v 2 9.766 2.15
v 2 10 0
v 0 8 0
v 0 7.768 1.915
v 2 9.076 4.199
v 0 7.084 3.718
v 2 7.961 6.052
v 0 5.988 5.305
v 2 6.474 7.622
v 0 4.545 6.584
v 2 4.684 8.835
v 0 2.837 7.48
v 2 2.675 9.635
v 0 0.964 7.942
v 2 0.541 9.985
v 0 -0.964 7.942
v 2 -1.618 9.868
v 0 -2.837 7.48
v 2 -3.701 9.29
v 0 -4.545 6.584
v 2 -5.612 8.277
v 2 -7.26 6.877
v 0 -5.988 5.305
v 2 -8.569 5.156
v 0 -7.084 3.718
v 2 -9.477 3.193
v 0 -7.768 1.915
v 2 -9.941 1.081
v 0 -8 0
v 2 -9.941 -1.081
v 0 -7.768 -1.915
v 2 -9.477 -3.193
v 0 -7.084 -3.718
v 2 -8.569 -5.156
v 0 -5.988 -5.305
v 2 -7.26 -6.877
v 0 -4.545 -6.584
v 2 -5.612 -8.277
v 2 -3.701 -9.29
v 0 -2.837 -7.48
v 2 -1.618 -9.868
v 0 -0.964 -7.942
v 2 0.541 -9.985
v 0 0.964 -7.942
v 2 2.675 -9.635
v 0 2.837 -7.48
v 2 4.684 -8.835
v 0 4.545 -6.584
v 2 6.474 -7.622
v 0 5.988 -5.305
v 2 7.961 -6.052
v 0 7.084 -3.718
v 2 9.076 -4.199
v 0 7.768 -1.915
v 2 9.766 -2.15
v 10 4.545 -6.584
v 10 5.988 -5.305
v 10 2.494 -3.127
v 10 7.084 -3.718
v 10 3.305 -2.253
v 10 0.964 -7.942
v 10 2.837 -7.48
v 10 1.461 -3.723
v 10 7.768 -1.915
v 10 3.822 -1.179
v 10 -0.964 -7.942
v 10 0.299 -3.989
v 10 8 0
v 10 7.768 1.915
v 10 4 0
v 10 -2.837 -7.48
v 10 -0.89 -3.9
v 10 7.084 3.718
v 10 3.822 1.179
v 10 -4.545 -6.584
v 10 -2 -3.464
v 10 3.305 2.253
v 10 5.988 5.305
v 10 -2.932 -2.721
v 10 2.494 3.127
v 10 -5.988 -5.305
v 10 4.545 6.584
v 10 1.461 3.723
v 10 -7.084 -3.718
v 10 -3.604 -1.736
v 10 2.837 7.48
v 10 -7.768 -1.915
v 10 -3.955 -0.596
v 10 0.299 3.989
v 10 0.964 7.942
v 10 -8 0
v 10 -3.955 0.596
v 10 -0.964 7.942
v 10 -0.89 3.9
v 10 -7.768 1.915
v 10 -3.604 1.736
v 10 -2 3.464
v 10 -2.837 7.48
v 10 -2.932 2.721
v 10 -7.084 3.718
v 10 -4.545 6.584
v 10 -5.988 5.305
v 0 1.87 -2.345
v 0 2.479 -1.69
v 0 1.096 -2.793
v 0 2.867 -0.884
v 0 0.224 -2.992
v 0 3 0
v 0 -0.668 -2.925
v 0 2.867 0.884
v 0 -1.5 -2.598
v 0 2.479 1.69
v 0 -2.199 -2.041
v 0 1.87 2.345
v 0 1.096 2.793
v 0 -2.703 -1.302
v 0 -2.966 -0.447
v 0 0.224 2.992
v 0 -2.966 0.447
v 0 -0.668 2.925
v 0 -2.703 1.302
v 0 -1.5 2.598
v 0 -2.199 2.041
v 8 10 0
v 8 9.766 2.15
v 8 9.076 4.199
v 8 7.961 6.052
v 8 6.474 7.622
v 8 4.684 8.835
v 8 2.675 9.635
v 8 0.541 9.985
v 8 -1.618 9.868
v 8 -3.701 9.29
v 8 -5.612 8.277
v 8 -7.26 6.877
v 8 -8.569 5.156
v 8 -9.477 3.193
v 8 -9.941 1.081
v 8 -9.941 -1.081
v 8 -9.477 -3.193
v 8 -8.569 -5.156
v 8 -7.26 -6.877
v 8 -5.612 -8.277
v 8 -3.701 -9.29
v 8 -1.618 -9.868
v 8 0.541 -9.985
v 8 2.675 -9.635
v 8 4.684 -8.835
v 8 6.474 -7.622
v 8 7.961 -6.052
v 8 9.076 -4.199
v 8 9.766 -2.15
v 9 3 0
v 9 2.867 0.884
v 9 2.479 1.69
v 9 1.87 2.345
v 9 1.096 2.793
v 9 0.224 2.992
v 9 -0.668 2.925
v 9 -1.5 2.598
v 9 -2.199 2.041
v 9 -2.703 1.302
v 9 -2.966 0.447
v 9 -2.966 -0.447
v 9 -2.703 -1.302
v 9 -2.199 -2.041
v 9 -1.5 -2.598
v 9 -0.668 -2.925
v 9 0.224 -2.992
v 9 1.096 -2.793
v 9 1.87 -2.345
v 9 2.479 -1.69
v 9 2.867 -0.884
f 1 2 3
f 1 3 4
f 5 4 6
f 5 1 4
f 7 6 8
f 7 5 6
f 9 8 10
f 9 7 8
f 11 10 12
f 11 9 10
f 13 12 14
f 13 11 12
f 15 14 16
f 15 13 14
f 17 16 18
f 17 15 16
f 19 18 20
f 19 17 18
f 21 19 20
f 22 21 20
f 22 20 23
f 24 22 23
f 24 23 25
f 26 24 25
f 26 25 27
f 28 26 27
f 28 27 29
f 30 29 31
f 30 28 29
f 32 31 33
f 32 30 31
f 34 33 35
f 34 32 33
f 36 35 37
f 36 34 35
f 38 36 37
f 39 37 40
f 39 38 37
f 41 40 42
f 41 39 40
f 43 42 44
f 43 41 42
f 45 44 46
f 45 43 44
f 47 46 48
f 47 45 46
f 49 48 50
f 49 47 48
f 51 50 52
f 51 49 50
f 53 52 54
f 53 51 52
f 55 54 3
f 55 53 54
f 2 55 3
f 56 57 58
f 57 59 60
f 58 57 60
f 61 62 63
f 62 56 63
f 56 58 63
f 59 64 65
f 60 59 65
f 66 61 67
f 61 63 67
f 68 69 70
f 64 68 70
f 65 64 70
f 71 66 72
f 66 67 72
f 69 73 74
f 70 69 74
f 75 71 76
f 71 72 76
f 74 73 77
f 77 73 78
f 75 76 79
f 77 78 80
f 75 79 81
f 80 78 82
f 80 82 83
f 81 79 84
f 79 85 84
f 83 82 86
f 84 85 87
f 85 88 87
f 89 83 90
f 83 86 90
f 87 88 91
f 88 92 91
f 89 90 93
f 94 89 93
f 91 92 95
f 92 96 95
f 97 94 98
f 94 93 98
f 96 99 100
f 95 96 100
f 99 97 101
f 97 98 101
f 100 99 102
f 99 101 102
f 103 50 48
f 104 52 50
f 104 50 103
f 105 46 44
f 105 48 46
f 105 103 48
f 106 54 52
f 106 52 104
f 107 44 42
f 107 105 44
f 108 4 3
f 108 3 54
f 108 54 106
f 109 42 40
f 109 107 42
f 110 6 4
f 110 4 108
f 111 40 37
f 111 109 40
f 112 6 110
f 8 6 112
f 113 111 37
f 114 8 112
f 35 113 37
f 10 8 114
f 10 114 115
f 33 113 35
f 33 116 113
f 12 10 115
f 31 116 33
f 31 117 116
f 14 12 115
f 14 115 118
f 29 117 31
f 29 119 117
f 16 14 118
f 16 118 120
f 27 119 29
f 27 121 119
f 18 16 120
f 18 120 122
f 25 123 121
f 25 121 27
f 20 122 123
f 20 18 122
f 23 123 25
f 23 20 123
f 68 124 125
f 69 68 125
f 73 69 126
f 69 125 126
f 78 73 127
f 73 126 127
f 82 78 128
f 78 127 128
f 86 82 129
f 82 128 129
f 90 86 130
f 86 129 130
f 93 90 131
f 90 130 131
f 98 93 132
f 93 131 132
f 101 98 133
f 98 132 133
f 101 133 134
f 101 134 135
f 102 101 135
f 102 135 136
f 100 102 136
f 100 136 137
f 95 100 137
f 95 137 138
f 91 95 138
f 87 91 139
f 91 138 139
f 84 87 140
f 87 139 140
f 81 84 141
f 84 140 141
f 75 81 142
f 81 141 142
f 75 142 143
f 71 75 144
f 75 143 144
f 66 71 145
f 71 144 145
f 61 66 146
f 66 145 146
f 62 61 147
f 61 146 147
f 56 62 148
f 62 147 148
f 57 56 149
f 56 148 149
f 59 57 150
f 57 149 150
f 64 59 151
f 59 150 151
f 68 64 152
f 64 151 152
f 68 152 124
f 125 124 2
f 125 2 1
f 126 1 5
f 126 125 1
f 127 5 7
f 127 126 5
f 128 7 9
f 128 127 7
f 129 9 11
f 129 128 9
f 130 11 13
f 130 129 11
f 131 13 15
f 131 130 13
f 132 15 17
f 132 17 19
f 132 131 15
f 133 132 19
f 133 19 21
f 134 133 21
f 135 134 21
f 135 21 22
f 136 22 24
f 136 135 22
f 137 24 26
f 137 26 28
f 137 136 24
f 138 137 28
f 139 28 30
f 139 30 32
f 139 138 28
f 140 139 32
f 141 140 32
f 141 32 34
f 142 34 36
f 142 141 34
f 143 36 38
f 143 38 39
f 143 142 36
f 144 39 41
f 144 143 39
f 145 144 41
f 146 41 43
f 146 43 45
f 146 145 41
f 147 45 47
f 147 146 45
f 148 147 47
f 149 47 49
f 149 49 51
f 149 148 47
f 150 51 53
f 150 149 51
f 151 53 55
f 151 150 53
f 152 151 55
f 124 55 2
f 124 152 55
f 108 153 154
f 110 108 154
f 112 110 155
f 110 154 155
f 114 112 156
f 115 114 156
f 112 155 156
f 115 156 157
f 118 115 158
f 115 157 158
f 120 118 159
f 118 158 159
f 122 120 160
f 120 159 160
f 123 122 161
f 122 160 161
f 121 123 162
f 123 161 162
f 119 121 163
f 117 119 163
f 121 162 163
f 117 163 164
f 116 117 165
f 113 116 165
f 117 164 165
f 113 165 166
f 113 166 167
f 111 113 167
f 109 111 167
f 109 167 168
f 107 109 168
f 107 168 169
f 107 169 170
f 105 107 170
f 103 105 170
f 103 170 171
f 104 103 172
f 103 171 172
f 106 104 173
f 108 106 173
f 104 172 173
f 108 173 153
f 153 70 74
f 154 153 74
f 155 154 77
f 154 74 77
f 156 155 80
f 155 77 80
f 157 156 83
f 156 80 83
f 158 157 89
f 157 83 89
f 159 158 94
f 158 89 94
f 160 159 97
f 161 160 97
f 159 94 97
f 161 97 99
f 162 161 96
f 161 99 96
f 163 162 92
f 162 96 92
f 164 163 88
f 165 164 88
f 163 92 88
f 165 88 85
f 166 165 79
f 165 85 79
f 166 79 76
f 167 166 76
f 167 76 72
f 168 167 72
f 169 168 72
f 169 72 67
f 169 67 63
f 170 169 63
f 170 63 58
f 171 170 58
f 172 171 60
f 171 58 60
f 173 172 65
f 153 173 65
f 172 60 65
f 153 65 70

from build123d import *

# Parameters (mm, degrees)
SKETCH1_W     = 10
SKETCH1_H     = 7
CHAMFER1_SIZE = 2
CHAMFER2_SIZE = 1


with BuildPart() as part:
    # Sketch1 → Revolve2 (revolve)
    with BuildSketch(Plane.XY):
        with Locations((5, 6.5)):
            Rectangle(SKETCH1_W, SKETCH1_H)
    revolve(axis=Axis((0, 0, 0), (1, 0, 0)))

    # Chamfer1
    chamfer1_edges = [part.edges().sort_by_distance(p)[0] for p in [
        (0, -10, 0),
        (10, -10, 0),
    ]]
    chamfer(chamfer1_edges, length=CHAMFER1_SIZE)

    # Chamfer2
    chamfer2_edges = [part.edges().sort_by_distance(p)[0] for p in [
        (10, -3, 0),
    ]]
    chamfer(chamfer2_edges, length=CHAMFER2_SIZE)


solid = part.part
